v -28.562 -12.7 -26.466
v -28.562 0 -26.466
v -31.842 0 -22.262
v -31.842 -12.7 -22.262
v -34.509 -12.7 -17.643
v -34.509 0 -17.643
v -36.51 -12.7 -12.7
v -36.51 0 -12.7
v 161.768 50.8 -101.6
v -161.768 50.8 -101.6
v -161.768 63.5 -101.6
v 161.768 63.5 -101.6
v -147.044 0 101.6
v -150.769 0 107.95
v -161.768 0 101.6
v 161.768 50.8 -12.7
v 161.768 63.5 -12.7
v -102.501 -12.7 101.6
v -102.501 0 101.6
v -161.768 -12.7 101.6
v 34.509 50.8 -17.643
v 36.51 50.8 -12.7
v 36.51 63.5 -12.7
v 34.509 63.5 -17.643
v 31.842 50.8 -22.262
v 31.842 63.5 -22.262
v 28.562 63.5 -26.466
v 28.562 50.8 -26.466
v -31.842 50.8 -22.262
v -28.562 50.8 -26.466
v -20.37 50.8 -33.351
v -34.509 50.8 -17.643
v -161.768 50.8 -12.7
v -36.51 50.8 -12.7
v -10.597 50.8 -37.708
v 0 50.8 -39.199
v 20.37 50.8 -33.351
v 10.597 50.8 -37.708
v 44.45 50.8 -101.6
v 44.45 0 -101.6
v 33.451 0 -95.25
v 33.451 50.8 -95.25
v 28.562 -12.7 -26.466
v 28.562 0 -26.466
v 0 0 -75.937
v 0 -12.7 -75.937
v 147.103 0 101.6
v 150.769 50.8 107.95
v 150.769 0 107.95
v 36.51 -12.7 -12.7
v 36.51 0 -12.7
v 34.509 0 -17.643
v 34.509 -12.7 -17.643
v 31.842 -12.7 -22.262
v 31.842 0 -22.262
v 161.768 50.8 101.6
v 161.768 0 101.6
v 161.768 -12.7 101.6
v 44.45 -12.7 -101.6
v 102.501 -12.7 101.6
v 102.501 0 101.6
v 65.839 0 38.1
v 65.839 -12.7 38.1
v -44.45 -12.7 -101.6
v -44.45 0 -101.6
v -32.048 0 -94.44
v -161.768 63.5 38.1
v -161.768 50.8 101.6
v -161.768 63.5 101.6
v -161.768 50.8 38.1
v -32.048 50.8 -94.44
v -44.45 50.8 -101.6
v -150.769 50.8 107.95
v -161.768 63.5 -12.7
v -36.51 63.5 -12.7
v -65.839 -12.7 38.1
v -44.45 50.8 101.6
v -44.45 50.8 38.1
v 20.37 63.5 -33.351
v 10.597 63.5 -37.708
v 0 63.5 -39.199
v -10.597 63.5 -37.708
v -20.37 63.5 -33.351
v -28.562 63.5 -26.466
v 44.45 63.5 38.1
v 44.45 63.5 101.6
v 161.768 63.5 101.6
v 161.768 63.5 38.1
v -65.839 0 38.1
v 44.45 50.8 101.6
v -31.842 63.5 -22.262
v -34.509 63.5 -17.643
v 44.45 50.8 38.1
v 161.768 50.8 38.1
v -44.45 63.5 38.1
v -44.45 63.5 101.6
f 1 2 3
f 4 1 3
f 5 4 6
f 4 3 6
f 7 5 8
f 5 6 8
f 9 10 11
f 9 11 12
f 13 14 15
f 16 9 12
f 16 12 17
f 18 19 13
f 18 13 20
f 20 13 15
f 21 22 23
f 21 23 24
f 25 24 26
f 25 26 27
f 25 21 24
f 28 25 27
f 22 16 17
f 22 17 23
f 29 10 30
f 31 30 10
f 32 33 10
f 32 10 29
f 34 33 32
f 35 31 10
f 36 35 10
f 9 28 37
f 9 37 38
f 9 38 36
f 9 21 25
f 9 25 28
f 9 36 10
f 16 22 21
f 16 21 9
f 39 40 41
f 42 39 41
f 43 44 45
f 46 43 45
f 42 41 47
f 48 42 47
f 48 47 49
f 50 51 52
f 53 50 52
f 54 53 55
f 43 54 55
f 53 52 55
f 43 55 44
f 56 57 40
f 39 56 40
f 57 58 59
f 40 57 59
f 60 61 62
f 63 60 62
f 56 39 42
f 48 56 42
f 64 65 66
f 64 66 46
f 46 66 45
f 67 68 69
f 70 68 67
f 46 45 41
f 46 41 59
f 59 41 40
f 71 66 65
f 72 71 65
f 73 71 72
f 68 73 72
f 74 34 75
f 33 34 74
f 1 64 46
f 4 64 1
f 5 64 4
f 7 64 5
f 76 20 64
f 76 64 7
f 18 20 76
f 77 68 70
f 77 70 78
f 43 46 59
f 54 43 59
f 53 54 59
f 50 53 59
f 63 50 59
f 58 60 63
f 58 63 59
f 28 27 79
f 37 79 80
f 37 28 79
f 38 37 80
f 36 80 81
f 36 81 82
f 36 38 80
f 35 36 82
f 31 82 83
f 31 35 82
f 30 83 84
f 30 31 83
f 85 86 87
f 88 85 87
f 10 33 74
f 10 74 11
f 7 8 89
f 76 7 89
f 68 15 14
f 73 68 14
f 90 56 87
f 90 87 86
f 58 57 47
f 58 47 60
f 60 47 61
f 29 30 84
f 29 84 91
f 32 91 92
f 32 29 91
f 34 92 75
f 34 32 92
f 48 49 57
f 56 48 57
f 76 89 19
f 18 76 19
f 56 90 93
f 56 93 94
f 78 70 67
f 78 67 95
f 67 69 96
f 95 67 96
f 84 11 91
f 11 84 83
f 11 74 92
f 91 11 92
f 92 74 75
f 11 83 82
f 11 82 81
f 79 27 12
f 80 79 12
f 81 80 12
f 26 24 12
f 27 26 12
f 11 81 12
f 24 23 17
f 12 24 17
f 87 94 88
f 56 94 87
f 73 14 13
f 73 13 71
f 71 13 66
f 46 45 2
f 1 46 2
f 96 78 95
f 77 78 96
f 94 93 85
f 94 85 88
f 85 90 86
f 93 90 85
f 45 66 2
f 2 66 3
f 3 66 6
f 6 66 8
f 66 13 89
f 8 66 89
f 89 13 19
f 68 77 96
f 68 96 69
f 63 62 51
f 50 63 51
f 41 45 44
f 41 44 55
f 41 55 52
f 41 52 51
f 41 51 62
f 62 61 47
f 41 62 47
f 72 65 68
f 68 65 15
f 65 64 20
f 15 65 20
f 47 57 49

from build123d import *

# Parameters (mm, degrees)
F1_DEPTH = 12.7
F3_DEPTH = 50.8
F5_DEPTH = 50.8
F8_START = -50.8
F8_DEPTH = 12.7


with BuildPart() as f1:
    # F0 (on Front) → F1 (new body)
    with BuildSketch(Plane.XZ):
        Polygon((95.776438931, -12.7), (44.45, -12.7), (44.45, -101.6), align=None)
        Polygon((65.8391659391, 38.1), (44.45, 1.0528778619), (44.45, -12.7), (95.776438931, -12.7), (125.1058326058, 38.1), align=None)
        Polygon((161.7675746993, 101.6), (102.5009080327, 101.6), (65.8391659391, 38.1), (125.1058326058, 38.1), align=None)
        with BuildLine():
            Line((44.45, -101.6), (44.45, -12.7))
            Line((44.45, -12.7), (36.5097722643, -12.7))
            ThreePointArc((36.5097722643, -12.7), (33.2559618085, -19.9987199729), (28.5619901248, -26.4659624732))
            Line((28.5619901248, -26.4659624732), (0, -75.9367805345))
            Line((0, -75.9367805345), (44.45, -101.6))
        make_face()
        Polygon((44.45, -12.7), (44.45, 1.0528778619), (36.5097722643, -12.7), align=None)
    extrude(amount=F1_DEPTH)

    # F4 (on face) → F5 (join)
    with BuildSketch(Plane(origin=(0, 0, 0), x_dir=(-1, 0, 0), z_dir=(0, 1, 0))):
        Polygon((-150.7690520713, 107.95), (-161.7675746993, 101.6), (-44.45, -101.6), (-33.4514773719, -95.25), align=None)
    extrude(amount=F5_DEPTH)


with BuildPart() as f1b:
    # F0 (on Front) → F1, piece 2 (new body)
    with BuildSketch(Plane.XZ):
        Polygon((-44.45, -101.6), (-44.45, -12.7), (-95.776438931, -12.7), align=None)
        Polygon((-44.45, -12.7), (-44.45, 1.0528778619), (-65.8391659391, 38.1), (-125.1058326058, 38.1), (-95.776438931, -12.7), align=None)
        Polygon((-65.8391659391, 38.1), (-102.5009080327, 101.6), (-103.1087873497, 101.6), (-161.7675746993, 101.6), (-125.1058326058, 38.1), align=None)
        with BuildLine():
            Line((-36.5097722643, -12.7), (-44.45, -12.7))
            Line((-44.45, -12.7), (-44.45, -101.6))
            Line((-44.45, -101.6), (0, -75.9367805345))
            Line((0, -75.9367805345), (-28.5619901248, -26.4659624732))
            ThreePointArc((-28.5619901248, -26.4659624732), (-33.2559618085, -19.9987199729), (-36.5097722643, -12.7))
        make_face()
        Polygon((-36.5097722643, -12.7), (-44.45, 1.0528778619), (-44.45, -12.7), align=None)
    extrude(amount=F1_DEPTH)

    # F2 (on face) → F3 (join)
    with BuildSketch(Plane(origin=(0, 0, 0), x_dir=(-1, 0, 0), z_dir=(0, 1, 0))):
        Polygon((44.45, -101.6), (161.7675746993, 101.6), (150.7690520713, 107.95), (32.047920336, -94.4396559675), align=None)
    extrude(amount=F3_DEPTH)


with BuildPart() as f8:
    # F0 (on Front) → F8 (new body)
    with BuildSketch(Plane.XZ.offset(F8_START)):
        Polygon((161.7675746993, 38.1), (161.7675746993, 101.6), (125.1058326058, 38.1), align=None)
        Polygon((102.5009080327, 101.6), (44.45, 101.6), (44.45, 38.1), (65.8391659391, 38.1), align=None)
        Polygon((161.7675746993, 101.6), (102.5009080327, 101.6), (65.8391659391, 38.1), (125.1058326058, 38.1), align=None)
    extrude(amount=-F8_DEPTH)


with BuildPart() as f8b:
    # F0 (on Front) → F8, piece 2 (new body)
    with BuildSketch(Plane.XZ.offset(F8_START)):
        with BuildLine():
            Line((0, -75.9367805345), (28.5619901248, -26.4659624732))
            ThreePointArc((28.5619901248, -26.4659624732), (0, -39.1990584752), (-28.5619901248, -26.4659624732))
            Line((-28.5619901248, -26.4659624732), (0, -75.9367805345))
        make_face()
        Polygon((-44.45, -101.6), (44.45, -101.6), (0, -75.9367805345), align=None)
        Polygon((95.776438931, -12.7), (44.45, -101.6), (161.7675746993, -101.6), (161.7675746993, -12.7), align=None)
        Polygon((95.776438931, -12.7), (44.45, -12.7), (44.45, -101.6), align=None)
        Polygon((-161.7675746993, -101.6), (-44.45, -101.6), (-95.776438931, -12.7), (-161.7675746993, -12.7), align=None)
        with BuildLine():
            Line((-36.5097722643, -12.7), (-44.45, -12.7))
            Line((-44.45, -12.7), (-44.45, -101.6))
            Line((-44.45, -101.6), (0, -75.9367805345))
            Line((0, -75.9367805345), (-28.5619901248, -26.4659624732))
            ThreePointArc((-28.5619901248, -26.4659624732), (-33.2559618085, -19.9987199729), (-36.5097722643, -12.7))
        make_face()
        Polygon((-44.45, -101.6), (-44.45, -12.7), (-95.776438931, -12.7), align=None)
        with BuildLine():
            Line((44.45, -101.6), (44.45, -12.7))
            Line((44.45, -12.7), (36.5097722643, -12.7))
            ThreePointArc((36.5097722643, -12.7), (33.2559618085, -19.9987199729), (28.5619901248, -26.4659624732))
            Line((28.5619901248, -26.4659624732), (0, -75.9367805345))
            Line((0, -75.9367805345), (44.45, -101.6))
        make_face()
    extrude(amount=-F8_DEPTH)


with BuildPart() as f8c:
    # F0 (on Front) → F8, piece 3 (new body)
    with BuildSketch(Plane.XZ.offset(F8_START)):
        Polygon((-65.8391659391, 38.1), (-102.5009080327, 101.6), (-103.1087873497, 101.6), (-161.7675746993, 101.6), (-125.1058326058, 38.1), align=None)
        Polygon((-44.45, 38.1), (-44.45, 101.6), (-102.5009080327, 101.6), (-65.8391659391, 38.1), align=None)
        Polygon((-161.7675746993, 38.1), (-125.1058326058, 38.1), (-161.7675746993, 101.6), align=None)
    extrude(amount=-F8_DEPTH)


solid = Compound([f1.part, f1b.part, f8.part, f8b.part, f8c.part])
